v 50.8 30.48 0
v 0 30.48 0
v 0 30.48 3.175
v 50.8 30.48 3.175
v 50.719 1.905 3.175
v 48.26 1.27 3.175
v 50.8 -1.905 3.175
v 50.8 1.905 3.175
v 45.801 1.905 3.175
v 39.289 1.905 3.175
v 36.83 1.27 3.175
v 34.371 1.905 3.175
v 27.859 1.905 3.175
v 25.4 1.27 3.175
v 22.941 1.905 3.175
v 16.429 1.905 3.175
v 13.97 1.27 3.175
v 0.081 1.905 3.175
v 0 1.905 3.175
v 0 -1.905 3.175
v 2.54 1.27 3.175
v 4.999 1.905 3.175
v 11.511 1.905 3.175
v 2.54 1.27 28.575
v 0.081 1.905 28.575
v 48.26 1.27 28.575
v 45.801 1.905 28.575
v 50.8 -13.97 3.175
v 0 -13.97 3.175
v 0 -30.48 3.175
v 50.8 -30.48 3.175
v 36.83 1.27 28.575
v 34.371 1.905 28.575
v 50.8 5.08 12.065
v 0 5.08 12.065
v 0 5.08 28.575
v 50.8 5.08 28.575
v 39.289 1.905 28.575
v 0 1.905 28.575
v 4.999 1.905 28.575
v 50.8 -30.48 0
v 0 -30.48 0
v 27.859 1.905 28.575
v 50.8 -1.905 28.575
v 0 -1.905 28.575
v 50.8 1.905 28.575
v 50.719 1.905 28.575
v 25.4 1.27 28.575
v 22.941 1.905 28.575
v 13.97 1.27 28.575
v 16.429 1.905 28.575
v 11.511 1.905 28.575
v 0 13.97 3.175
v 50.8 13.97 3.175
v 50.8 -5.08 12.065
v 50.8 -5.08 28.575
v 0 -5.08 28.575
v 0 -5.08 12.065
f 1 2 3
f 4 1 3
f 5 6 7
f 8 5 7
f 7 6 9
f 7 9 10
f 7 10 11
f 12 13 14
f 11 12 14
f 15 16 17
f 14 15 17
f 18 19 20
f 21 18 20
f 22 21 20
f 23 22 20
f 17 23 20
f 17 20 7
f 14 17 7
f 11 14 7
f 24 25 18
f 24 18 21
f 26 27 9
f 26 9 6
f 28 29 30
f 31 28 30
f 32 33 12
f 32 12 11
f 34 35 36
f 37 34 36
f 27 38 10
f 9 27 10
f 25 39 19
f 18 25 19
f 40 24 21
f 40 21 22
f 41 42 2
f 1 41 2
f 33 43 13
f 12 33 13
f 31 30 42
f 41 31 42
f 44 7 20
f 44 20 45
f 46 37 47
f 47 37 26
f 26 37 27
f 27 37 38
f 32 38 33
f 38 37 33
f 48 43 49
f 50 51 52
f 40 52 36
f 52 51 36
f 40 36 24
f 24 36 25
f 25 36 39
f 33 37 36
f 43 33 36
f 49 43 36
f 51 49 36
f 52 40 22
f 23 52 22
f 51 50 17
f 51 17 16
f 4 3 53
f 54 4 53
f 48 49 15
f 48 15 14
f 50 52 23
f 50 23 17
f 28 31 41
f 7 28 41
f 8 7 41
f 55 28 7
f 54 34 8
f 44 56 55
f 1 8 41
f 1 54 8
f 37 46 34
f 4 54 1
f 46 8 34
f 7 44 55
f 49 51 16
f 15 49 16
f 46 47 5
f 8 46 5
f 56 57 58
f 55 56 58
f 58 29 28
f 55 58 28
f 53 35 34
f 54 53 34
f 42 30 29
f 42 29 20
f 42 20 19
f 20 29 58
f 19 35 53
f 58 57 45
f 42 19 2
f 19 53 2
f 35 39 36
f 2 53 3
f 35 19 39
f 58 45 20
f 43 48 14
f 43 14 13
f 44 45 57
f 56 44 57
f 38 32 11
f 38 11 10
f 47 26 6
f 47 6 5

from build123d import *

# Parameters (mm, degrees)
F1_DEPTH = 50.8
F2_SIZE  = 8.89
F4_DEPTH = 25.4


with BuildPart() as f1:
    # F0 (on Right) → F1 (new body)
    with BuildSketch(Plane.YZ):
        Polygon((-30.48, 0), (0, 0), (30.48, 0), (30.48, 3.175), (5.08, 3.175), (5.08, 28.575), (1.905, 28.575), (1.905, 3.175), (0, 3.175), (-1.905, 3.175), (-1.905, 28.575), (-5.08, 28.575), (-5.08, 3.175), (-30.48, 3.175), align=None)
    extrude(amount=F1_DEPTH)

    # F2
    f2_edges = [f1.edges().sort_by_distance(p)[0] for p in [
        (25.4, 5.08, 3.175),
        (25.4, -5.08, 3.175),
    ]]
    chamfer(f2_edges, length=F2_SIZE)

    # F3 (on face) → F4 (join, through all)
    with BuildSketch(Plane.XY.offset(28.575)):
        Polygon((2.54, 1.27), (4.999344, 1.905), (0.080656, 1.905), align=None)
        Polygon((13.97, 1.27), (16.429344, 1.905), (11.510656, 1.905), align=None)
        Polygon((27.859344, 1.905), (25.4, 1.905), (25.4, 1.27), align=None)
        Polygon((25.4, 1.27), (25.4, 1.905), (22.940656, 1.905), align=None)
        Polygon((39.289344, 1.905), (34.370656, 1.905), (36.83, 1.27), align=None)
        Polygon((50.719344, 1.905), (45.800656, 1.905), (48.26, 1.27), align=None)
    extrude(amount=-F4_DEPTH)


solid = f1.part
